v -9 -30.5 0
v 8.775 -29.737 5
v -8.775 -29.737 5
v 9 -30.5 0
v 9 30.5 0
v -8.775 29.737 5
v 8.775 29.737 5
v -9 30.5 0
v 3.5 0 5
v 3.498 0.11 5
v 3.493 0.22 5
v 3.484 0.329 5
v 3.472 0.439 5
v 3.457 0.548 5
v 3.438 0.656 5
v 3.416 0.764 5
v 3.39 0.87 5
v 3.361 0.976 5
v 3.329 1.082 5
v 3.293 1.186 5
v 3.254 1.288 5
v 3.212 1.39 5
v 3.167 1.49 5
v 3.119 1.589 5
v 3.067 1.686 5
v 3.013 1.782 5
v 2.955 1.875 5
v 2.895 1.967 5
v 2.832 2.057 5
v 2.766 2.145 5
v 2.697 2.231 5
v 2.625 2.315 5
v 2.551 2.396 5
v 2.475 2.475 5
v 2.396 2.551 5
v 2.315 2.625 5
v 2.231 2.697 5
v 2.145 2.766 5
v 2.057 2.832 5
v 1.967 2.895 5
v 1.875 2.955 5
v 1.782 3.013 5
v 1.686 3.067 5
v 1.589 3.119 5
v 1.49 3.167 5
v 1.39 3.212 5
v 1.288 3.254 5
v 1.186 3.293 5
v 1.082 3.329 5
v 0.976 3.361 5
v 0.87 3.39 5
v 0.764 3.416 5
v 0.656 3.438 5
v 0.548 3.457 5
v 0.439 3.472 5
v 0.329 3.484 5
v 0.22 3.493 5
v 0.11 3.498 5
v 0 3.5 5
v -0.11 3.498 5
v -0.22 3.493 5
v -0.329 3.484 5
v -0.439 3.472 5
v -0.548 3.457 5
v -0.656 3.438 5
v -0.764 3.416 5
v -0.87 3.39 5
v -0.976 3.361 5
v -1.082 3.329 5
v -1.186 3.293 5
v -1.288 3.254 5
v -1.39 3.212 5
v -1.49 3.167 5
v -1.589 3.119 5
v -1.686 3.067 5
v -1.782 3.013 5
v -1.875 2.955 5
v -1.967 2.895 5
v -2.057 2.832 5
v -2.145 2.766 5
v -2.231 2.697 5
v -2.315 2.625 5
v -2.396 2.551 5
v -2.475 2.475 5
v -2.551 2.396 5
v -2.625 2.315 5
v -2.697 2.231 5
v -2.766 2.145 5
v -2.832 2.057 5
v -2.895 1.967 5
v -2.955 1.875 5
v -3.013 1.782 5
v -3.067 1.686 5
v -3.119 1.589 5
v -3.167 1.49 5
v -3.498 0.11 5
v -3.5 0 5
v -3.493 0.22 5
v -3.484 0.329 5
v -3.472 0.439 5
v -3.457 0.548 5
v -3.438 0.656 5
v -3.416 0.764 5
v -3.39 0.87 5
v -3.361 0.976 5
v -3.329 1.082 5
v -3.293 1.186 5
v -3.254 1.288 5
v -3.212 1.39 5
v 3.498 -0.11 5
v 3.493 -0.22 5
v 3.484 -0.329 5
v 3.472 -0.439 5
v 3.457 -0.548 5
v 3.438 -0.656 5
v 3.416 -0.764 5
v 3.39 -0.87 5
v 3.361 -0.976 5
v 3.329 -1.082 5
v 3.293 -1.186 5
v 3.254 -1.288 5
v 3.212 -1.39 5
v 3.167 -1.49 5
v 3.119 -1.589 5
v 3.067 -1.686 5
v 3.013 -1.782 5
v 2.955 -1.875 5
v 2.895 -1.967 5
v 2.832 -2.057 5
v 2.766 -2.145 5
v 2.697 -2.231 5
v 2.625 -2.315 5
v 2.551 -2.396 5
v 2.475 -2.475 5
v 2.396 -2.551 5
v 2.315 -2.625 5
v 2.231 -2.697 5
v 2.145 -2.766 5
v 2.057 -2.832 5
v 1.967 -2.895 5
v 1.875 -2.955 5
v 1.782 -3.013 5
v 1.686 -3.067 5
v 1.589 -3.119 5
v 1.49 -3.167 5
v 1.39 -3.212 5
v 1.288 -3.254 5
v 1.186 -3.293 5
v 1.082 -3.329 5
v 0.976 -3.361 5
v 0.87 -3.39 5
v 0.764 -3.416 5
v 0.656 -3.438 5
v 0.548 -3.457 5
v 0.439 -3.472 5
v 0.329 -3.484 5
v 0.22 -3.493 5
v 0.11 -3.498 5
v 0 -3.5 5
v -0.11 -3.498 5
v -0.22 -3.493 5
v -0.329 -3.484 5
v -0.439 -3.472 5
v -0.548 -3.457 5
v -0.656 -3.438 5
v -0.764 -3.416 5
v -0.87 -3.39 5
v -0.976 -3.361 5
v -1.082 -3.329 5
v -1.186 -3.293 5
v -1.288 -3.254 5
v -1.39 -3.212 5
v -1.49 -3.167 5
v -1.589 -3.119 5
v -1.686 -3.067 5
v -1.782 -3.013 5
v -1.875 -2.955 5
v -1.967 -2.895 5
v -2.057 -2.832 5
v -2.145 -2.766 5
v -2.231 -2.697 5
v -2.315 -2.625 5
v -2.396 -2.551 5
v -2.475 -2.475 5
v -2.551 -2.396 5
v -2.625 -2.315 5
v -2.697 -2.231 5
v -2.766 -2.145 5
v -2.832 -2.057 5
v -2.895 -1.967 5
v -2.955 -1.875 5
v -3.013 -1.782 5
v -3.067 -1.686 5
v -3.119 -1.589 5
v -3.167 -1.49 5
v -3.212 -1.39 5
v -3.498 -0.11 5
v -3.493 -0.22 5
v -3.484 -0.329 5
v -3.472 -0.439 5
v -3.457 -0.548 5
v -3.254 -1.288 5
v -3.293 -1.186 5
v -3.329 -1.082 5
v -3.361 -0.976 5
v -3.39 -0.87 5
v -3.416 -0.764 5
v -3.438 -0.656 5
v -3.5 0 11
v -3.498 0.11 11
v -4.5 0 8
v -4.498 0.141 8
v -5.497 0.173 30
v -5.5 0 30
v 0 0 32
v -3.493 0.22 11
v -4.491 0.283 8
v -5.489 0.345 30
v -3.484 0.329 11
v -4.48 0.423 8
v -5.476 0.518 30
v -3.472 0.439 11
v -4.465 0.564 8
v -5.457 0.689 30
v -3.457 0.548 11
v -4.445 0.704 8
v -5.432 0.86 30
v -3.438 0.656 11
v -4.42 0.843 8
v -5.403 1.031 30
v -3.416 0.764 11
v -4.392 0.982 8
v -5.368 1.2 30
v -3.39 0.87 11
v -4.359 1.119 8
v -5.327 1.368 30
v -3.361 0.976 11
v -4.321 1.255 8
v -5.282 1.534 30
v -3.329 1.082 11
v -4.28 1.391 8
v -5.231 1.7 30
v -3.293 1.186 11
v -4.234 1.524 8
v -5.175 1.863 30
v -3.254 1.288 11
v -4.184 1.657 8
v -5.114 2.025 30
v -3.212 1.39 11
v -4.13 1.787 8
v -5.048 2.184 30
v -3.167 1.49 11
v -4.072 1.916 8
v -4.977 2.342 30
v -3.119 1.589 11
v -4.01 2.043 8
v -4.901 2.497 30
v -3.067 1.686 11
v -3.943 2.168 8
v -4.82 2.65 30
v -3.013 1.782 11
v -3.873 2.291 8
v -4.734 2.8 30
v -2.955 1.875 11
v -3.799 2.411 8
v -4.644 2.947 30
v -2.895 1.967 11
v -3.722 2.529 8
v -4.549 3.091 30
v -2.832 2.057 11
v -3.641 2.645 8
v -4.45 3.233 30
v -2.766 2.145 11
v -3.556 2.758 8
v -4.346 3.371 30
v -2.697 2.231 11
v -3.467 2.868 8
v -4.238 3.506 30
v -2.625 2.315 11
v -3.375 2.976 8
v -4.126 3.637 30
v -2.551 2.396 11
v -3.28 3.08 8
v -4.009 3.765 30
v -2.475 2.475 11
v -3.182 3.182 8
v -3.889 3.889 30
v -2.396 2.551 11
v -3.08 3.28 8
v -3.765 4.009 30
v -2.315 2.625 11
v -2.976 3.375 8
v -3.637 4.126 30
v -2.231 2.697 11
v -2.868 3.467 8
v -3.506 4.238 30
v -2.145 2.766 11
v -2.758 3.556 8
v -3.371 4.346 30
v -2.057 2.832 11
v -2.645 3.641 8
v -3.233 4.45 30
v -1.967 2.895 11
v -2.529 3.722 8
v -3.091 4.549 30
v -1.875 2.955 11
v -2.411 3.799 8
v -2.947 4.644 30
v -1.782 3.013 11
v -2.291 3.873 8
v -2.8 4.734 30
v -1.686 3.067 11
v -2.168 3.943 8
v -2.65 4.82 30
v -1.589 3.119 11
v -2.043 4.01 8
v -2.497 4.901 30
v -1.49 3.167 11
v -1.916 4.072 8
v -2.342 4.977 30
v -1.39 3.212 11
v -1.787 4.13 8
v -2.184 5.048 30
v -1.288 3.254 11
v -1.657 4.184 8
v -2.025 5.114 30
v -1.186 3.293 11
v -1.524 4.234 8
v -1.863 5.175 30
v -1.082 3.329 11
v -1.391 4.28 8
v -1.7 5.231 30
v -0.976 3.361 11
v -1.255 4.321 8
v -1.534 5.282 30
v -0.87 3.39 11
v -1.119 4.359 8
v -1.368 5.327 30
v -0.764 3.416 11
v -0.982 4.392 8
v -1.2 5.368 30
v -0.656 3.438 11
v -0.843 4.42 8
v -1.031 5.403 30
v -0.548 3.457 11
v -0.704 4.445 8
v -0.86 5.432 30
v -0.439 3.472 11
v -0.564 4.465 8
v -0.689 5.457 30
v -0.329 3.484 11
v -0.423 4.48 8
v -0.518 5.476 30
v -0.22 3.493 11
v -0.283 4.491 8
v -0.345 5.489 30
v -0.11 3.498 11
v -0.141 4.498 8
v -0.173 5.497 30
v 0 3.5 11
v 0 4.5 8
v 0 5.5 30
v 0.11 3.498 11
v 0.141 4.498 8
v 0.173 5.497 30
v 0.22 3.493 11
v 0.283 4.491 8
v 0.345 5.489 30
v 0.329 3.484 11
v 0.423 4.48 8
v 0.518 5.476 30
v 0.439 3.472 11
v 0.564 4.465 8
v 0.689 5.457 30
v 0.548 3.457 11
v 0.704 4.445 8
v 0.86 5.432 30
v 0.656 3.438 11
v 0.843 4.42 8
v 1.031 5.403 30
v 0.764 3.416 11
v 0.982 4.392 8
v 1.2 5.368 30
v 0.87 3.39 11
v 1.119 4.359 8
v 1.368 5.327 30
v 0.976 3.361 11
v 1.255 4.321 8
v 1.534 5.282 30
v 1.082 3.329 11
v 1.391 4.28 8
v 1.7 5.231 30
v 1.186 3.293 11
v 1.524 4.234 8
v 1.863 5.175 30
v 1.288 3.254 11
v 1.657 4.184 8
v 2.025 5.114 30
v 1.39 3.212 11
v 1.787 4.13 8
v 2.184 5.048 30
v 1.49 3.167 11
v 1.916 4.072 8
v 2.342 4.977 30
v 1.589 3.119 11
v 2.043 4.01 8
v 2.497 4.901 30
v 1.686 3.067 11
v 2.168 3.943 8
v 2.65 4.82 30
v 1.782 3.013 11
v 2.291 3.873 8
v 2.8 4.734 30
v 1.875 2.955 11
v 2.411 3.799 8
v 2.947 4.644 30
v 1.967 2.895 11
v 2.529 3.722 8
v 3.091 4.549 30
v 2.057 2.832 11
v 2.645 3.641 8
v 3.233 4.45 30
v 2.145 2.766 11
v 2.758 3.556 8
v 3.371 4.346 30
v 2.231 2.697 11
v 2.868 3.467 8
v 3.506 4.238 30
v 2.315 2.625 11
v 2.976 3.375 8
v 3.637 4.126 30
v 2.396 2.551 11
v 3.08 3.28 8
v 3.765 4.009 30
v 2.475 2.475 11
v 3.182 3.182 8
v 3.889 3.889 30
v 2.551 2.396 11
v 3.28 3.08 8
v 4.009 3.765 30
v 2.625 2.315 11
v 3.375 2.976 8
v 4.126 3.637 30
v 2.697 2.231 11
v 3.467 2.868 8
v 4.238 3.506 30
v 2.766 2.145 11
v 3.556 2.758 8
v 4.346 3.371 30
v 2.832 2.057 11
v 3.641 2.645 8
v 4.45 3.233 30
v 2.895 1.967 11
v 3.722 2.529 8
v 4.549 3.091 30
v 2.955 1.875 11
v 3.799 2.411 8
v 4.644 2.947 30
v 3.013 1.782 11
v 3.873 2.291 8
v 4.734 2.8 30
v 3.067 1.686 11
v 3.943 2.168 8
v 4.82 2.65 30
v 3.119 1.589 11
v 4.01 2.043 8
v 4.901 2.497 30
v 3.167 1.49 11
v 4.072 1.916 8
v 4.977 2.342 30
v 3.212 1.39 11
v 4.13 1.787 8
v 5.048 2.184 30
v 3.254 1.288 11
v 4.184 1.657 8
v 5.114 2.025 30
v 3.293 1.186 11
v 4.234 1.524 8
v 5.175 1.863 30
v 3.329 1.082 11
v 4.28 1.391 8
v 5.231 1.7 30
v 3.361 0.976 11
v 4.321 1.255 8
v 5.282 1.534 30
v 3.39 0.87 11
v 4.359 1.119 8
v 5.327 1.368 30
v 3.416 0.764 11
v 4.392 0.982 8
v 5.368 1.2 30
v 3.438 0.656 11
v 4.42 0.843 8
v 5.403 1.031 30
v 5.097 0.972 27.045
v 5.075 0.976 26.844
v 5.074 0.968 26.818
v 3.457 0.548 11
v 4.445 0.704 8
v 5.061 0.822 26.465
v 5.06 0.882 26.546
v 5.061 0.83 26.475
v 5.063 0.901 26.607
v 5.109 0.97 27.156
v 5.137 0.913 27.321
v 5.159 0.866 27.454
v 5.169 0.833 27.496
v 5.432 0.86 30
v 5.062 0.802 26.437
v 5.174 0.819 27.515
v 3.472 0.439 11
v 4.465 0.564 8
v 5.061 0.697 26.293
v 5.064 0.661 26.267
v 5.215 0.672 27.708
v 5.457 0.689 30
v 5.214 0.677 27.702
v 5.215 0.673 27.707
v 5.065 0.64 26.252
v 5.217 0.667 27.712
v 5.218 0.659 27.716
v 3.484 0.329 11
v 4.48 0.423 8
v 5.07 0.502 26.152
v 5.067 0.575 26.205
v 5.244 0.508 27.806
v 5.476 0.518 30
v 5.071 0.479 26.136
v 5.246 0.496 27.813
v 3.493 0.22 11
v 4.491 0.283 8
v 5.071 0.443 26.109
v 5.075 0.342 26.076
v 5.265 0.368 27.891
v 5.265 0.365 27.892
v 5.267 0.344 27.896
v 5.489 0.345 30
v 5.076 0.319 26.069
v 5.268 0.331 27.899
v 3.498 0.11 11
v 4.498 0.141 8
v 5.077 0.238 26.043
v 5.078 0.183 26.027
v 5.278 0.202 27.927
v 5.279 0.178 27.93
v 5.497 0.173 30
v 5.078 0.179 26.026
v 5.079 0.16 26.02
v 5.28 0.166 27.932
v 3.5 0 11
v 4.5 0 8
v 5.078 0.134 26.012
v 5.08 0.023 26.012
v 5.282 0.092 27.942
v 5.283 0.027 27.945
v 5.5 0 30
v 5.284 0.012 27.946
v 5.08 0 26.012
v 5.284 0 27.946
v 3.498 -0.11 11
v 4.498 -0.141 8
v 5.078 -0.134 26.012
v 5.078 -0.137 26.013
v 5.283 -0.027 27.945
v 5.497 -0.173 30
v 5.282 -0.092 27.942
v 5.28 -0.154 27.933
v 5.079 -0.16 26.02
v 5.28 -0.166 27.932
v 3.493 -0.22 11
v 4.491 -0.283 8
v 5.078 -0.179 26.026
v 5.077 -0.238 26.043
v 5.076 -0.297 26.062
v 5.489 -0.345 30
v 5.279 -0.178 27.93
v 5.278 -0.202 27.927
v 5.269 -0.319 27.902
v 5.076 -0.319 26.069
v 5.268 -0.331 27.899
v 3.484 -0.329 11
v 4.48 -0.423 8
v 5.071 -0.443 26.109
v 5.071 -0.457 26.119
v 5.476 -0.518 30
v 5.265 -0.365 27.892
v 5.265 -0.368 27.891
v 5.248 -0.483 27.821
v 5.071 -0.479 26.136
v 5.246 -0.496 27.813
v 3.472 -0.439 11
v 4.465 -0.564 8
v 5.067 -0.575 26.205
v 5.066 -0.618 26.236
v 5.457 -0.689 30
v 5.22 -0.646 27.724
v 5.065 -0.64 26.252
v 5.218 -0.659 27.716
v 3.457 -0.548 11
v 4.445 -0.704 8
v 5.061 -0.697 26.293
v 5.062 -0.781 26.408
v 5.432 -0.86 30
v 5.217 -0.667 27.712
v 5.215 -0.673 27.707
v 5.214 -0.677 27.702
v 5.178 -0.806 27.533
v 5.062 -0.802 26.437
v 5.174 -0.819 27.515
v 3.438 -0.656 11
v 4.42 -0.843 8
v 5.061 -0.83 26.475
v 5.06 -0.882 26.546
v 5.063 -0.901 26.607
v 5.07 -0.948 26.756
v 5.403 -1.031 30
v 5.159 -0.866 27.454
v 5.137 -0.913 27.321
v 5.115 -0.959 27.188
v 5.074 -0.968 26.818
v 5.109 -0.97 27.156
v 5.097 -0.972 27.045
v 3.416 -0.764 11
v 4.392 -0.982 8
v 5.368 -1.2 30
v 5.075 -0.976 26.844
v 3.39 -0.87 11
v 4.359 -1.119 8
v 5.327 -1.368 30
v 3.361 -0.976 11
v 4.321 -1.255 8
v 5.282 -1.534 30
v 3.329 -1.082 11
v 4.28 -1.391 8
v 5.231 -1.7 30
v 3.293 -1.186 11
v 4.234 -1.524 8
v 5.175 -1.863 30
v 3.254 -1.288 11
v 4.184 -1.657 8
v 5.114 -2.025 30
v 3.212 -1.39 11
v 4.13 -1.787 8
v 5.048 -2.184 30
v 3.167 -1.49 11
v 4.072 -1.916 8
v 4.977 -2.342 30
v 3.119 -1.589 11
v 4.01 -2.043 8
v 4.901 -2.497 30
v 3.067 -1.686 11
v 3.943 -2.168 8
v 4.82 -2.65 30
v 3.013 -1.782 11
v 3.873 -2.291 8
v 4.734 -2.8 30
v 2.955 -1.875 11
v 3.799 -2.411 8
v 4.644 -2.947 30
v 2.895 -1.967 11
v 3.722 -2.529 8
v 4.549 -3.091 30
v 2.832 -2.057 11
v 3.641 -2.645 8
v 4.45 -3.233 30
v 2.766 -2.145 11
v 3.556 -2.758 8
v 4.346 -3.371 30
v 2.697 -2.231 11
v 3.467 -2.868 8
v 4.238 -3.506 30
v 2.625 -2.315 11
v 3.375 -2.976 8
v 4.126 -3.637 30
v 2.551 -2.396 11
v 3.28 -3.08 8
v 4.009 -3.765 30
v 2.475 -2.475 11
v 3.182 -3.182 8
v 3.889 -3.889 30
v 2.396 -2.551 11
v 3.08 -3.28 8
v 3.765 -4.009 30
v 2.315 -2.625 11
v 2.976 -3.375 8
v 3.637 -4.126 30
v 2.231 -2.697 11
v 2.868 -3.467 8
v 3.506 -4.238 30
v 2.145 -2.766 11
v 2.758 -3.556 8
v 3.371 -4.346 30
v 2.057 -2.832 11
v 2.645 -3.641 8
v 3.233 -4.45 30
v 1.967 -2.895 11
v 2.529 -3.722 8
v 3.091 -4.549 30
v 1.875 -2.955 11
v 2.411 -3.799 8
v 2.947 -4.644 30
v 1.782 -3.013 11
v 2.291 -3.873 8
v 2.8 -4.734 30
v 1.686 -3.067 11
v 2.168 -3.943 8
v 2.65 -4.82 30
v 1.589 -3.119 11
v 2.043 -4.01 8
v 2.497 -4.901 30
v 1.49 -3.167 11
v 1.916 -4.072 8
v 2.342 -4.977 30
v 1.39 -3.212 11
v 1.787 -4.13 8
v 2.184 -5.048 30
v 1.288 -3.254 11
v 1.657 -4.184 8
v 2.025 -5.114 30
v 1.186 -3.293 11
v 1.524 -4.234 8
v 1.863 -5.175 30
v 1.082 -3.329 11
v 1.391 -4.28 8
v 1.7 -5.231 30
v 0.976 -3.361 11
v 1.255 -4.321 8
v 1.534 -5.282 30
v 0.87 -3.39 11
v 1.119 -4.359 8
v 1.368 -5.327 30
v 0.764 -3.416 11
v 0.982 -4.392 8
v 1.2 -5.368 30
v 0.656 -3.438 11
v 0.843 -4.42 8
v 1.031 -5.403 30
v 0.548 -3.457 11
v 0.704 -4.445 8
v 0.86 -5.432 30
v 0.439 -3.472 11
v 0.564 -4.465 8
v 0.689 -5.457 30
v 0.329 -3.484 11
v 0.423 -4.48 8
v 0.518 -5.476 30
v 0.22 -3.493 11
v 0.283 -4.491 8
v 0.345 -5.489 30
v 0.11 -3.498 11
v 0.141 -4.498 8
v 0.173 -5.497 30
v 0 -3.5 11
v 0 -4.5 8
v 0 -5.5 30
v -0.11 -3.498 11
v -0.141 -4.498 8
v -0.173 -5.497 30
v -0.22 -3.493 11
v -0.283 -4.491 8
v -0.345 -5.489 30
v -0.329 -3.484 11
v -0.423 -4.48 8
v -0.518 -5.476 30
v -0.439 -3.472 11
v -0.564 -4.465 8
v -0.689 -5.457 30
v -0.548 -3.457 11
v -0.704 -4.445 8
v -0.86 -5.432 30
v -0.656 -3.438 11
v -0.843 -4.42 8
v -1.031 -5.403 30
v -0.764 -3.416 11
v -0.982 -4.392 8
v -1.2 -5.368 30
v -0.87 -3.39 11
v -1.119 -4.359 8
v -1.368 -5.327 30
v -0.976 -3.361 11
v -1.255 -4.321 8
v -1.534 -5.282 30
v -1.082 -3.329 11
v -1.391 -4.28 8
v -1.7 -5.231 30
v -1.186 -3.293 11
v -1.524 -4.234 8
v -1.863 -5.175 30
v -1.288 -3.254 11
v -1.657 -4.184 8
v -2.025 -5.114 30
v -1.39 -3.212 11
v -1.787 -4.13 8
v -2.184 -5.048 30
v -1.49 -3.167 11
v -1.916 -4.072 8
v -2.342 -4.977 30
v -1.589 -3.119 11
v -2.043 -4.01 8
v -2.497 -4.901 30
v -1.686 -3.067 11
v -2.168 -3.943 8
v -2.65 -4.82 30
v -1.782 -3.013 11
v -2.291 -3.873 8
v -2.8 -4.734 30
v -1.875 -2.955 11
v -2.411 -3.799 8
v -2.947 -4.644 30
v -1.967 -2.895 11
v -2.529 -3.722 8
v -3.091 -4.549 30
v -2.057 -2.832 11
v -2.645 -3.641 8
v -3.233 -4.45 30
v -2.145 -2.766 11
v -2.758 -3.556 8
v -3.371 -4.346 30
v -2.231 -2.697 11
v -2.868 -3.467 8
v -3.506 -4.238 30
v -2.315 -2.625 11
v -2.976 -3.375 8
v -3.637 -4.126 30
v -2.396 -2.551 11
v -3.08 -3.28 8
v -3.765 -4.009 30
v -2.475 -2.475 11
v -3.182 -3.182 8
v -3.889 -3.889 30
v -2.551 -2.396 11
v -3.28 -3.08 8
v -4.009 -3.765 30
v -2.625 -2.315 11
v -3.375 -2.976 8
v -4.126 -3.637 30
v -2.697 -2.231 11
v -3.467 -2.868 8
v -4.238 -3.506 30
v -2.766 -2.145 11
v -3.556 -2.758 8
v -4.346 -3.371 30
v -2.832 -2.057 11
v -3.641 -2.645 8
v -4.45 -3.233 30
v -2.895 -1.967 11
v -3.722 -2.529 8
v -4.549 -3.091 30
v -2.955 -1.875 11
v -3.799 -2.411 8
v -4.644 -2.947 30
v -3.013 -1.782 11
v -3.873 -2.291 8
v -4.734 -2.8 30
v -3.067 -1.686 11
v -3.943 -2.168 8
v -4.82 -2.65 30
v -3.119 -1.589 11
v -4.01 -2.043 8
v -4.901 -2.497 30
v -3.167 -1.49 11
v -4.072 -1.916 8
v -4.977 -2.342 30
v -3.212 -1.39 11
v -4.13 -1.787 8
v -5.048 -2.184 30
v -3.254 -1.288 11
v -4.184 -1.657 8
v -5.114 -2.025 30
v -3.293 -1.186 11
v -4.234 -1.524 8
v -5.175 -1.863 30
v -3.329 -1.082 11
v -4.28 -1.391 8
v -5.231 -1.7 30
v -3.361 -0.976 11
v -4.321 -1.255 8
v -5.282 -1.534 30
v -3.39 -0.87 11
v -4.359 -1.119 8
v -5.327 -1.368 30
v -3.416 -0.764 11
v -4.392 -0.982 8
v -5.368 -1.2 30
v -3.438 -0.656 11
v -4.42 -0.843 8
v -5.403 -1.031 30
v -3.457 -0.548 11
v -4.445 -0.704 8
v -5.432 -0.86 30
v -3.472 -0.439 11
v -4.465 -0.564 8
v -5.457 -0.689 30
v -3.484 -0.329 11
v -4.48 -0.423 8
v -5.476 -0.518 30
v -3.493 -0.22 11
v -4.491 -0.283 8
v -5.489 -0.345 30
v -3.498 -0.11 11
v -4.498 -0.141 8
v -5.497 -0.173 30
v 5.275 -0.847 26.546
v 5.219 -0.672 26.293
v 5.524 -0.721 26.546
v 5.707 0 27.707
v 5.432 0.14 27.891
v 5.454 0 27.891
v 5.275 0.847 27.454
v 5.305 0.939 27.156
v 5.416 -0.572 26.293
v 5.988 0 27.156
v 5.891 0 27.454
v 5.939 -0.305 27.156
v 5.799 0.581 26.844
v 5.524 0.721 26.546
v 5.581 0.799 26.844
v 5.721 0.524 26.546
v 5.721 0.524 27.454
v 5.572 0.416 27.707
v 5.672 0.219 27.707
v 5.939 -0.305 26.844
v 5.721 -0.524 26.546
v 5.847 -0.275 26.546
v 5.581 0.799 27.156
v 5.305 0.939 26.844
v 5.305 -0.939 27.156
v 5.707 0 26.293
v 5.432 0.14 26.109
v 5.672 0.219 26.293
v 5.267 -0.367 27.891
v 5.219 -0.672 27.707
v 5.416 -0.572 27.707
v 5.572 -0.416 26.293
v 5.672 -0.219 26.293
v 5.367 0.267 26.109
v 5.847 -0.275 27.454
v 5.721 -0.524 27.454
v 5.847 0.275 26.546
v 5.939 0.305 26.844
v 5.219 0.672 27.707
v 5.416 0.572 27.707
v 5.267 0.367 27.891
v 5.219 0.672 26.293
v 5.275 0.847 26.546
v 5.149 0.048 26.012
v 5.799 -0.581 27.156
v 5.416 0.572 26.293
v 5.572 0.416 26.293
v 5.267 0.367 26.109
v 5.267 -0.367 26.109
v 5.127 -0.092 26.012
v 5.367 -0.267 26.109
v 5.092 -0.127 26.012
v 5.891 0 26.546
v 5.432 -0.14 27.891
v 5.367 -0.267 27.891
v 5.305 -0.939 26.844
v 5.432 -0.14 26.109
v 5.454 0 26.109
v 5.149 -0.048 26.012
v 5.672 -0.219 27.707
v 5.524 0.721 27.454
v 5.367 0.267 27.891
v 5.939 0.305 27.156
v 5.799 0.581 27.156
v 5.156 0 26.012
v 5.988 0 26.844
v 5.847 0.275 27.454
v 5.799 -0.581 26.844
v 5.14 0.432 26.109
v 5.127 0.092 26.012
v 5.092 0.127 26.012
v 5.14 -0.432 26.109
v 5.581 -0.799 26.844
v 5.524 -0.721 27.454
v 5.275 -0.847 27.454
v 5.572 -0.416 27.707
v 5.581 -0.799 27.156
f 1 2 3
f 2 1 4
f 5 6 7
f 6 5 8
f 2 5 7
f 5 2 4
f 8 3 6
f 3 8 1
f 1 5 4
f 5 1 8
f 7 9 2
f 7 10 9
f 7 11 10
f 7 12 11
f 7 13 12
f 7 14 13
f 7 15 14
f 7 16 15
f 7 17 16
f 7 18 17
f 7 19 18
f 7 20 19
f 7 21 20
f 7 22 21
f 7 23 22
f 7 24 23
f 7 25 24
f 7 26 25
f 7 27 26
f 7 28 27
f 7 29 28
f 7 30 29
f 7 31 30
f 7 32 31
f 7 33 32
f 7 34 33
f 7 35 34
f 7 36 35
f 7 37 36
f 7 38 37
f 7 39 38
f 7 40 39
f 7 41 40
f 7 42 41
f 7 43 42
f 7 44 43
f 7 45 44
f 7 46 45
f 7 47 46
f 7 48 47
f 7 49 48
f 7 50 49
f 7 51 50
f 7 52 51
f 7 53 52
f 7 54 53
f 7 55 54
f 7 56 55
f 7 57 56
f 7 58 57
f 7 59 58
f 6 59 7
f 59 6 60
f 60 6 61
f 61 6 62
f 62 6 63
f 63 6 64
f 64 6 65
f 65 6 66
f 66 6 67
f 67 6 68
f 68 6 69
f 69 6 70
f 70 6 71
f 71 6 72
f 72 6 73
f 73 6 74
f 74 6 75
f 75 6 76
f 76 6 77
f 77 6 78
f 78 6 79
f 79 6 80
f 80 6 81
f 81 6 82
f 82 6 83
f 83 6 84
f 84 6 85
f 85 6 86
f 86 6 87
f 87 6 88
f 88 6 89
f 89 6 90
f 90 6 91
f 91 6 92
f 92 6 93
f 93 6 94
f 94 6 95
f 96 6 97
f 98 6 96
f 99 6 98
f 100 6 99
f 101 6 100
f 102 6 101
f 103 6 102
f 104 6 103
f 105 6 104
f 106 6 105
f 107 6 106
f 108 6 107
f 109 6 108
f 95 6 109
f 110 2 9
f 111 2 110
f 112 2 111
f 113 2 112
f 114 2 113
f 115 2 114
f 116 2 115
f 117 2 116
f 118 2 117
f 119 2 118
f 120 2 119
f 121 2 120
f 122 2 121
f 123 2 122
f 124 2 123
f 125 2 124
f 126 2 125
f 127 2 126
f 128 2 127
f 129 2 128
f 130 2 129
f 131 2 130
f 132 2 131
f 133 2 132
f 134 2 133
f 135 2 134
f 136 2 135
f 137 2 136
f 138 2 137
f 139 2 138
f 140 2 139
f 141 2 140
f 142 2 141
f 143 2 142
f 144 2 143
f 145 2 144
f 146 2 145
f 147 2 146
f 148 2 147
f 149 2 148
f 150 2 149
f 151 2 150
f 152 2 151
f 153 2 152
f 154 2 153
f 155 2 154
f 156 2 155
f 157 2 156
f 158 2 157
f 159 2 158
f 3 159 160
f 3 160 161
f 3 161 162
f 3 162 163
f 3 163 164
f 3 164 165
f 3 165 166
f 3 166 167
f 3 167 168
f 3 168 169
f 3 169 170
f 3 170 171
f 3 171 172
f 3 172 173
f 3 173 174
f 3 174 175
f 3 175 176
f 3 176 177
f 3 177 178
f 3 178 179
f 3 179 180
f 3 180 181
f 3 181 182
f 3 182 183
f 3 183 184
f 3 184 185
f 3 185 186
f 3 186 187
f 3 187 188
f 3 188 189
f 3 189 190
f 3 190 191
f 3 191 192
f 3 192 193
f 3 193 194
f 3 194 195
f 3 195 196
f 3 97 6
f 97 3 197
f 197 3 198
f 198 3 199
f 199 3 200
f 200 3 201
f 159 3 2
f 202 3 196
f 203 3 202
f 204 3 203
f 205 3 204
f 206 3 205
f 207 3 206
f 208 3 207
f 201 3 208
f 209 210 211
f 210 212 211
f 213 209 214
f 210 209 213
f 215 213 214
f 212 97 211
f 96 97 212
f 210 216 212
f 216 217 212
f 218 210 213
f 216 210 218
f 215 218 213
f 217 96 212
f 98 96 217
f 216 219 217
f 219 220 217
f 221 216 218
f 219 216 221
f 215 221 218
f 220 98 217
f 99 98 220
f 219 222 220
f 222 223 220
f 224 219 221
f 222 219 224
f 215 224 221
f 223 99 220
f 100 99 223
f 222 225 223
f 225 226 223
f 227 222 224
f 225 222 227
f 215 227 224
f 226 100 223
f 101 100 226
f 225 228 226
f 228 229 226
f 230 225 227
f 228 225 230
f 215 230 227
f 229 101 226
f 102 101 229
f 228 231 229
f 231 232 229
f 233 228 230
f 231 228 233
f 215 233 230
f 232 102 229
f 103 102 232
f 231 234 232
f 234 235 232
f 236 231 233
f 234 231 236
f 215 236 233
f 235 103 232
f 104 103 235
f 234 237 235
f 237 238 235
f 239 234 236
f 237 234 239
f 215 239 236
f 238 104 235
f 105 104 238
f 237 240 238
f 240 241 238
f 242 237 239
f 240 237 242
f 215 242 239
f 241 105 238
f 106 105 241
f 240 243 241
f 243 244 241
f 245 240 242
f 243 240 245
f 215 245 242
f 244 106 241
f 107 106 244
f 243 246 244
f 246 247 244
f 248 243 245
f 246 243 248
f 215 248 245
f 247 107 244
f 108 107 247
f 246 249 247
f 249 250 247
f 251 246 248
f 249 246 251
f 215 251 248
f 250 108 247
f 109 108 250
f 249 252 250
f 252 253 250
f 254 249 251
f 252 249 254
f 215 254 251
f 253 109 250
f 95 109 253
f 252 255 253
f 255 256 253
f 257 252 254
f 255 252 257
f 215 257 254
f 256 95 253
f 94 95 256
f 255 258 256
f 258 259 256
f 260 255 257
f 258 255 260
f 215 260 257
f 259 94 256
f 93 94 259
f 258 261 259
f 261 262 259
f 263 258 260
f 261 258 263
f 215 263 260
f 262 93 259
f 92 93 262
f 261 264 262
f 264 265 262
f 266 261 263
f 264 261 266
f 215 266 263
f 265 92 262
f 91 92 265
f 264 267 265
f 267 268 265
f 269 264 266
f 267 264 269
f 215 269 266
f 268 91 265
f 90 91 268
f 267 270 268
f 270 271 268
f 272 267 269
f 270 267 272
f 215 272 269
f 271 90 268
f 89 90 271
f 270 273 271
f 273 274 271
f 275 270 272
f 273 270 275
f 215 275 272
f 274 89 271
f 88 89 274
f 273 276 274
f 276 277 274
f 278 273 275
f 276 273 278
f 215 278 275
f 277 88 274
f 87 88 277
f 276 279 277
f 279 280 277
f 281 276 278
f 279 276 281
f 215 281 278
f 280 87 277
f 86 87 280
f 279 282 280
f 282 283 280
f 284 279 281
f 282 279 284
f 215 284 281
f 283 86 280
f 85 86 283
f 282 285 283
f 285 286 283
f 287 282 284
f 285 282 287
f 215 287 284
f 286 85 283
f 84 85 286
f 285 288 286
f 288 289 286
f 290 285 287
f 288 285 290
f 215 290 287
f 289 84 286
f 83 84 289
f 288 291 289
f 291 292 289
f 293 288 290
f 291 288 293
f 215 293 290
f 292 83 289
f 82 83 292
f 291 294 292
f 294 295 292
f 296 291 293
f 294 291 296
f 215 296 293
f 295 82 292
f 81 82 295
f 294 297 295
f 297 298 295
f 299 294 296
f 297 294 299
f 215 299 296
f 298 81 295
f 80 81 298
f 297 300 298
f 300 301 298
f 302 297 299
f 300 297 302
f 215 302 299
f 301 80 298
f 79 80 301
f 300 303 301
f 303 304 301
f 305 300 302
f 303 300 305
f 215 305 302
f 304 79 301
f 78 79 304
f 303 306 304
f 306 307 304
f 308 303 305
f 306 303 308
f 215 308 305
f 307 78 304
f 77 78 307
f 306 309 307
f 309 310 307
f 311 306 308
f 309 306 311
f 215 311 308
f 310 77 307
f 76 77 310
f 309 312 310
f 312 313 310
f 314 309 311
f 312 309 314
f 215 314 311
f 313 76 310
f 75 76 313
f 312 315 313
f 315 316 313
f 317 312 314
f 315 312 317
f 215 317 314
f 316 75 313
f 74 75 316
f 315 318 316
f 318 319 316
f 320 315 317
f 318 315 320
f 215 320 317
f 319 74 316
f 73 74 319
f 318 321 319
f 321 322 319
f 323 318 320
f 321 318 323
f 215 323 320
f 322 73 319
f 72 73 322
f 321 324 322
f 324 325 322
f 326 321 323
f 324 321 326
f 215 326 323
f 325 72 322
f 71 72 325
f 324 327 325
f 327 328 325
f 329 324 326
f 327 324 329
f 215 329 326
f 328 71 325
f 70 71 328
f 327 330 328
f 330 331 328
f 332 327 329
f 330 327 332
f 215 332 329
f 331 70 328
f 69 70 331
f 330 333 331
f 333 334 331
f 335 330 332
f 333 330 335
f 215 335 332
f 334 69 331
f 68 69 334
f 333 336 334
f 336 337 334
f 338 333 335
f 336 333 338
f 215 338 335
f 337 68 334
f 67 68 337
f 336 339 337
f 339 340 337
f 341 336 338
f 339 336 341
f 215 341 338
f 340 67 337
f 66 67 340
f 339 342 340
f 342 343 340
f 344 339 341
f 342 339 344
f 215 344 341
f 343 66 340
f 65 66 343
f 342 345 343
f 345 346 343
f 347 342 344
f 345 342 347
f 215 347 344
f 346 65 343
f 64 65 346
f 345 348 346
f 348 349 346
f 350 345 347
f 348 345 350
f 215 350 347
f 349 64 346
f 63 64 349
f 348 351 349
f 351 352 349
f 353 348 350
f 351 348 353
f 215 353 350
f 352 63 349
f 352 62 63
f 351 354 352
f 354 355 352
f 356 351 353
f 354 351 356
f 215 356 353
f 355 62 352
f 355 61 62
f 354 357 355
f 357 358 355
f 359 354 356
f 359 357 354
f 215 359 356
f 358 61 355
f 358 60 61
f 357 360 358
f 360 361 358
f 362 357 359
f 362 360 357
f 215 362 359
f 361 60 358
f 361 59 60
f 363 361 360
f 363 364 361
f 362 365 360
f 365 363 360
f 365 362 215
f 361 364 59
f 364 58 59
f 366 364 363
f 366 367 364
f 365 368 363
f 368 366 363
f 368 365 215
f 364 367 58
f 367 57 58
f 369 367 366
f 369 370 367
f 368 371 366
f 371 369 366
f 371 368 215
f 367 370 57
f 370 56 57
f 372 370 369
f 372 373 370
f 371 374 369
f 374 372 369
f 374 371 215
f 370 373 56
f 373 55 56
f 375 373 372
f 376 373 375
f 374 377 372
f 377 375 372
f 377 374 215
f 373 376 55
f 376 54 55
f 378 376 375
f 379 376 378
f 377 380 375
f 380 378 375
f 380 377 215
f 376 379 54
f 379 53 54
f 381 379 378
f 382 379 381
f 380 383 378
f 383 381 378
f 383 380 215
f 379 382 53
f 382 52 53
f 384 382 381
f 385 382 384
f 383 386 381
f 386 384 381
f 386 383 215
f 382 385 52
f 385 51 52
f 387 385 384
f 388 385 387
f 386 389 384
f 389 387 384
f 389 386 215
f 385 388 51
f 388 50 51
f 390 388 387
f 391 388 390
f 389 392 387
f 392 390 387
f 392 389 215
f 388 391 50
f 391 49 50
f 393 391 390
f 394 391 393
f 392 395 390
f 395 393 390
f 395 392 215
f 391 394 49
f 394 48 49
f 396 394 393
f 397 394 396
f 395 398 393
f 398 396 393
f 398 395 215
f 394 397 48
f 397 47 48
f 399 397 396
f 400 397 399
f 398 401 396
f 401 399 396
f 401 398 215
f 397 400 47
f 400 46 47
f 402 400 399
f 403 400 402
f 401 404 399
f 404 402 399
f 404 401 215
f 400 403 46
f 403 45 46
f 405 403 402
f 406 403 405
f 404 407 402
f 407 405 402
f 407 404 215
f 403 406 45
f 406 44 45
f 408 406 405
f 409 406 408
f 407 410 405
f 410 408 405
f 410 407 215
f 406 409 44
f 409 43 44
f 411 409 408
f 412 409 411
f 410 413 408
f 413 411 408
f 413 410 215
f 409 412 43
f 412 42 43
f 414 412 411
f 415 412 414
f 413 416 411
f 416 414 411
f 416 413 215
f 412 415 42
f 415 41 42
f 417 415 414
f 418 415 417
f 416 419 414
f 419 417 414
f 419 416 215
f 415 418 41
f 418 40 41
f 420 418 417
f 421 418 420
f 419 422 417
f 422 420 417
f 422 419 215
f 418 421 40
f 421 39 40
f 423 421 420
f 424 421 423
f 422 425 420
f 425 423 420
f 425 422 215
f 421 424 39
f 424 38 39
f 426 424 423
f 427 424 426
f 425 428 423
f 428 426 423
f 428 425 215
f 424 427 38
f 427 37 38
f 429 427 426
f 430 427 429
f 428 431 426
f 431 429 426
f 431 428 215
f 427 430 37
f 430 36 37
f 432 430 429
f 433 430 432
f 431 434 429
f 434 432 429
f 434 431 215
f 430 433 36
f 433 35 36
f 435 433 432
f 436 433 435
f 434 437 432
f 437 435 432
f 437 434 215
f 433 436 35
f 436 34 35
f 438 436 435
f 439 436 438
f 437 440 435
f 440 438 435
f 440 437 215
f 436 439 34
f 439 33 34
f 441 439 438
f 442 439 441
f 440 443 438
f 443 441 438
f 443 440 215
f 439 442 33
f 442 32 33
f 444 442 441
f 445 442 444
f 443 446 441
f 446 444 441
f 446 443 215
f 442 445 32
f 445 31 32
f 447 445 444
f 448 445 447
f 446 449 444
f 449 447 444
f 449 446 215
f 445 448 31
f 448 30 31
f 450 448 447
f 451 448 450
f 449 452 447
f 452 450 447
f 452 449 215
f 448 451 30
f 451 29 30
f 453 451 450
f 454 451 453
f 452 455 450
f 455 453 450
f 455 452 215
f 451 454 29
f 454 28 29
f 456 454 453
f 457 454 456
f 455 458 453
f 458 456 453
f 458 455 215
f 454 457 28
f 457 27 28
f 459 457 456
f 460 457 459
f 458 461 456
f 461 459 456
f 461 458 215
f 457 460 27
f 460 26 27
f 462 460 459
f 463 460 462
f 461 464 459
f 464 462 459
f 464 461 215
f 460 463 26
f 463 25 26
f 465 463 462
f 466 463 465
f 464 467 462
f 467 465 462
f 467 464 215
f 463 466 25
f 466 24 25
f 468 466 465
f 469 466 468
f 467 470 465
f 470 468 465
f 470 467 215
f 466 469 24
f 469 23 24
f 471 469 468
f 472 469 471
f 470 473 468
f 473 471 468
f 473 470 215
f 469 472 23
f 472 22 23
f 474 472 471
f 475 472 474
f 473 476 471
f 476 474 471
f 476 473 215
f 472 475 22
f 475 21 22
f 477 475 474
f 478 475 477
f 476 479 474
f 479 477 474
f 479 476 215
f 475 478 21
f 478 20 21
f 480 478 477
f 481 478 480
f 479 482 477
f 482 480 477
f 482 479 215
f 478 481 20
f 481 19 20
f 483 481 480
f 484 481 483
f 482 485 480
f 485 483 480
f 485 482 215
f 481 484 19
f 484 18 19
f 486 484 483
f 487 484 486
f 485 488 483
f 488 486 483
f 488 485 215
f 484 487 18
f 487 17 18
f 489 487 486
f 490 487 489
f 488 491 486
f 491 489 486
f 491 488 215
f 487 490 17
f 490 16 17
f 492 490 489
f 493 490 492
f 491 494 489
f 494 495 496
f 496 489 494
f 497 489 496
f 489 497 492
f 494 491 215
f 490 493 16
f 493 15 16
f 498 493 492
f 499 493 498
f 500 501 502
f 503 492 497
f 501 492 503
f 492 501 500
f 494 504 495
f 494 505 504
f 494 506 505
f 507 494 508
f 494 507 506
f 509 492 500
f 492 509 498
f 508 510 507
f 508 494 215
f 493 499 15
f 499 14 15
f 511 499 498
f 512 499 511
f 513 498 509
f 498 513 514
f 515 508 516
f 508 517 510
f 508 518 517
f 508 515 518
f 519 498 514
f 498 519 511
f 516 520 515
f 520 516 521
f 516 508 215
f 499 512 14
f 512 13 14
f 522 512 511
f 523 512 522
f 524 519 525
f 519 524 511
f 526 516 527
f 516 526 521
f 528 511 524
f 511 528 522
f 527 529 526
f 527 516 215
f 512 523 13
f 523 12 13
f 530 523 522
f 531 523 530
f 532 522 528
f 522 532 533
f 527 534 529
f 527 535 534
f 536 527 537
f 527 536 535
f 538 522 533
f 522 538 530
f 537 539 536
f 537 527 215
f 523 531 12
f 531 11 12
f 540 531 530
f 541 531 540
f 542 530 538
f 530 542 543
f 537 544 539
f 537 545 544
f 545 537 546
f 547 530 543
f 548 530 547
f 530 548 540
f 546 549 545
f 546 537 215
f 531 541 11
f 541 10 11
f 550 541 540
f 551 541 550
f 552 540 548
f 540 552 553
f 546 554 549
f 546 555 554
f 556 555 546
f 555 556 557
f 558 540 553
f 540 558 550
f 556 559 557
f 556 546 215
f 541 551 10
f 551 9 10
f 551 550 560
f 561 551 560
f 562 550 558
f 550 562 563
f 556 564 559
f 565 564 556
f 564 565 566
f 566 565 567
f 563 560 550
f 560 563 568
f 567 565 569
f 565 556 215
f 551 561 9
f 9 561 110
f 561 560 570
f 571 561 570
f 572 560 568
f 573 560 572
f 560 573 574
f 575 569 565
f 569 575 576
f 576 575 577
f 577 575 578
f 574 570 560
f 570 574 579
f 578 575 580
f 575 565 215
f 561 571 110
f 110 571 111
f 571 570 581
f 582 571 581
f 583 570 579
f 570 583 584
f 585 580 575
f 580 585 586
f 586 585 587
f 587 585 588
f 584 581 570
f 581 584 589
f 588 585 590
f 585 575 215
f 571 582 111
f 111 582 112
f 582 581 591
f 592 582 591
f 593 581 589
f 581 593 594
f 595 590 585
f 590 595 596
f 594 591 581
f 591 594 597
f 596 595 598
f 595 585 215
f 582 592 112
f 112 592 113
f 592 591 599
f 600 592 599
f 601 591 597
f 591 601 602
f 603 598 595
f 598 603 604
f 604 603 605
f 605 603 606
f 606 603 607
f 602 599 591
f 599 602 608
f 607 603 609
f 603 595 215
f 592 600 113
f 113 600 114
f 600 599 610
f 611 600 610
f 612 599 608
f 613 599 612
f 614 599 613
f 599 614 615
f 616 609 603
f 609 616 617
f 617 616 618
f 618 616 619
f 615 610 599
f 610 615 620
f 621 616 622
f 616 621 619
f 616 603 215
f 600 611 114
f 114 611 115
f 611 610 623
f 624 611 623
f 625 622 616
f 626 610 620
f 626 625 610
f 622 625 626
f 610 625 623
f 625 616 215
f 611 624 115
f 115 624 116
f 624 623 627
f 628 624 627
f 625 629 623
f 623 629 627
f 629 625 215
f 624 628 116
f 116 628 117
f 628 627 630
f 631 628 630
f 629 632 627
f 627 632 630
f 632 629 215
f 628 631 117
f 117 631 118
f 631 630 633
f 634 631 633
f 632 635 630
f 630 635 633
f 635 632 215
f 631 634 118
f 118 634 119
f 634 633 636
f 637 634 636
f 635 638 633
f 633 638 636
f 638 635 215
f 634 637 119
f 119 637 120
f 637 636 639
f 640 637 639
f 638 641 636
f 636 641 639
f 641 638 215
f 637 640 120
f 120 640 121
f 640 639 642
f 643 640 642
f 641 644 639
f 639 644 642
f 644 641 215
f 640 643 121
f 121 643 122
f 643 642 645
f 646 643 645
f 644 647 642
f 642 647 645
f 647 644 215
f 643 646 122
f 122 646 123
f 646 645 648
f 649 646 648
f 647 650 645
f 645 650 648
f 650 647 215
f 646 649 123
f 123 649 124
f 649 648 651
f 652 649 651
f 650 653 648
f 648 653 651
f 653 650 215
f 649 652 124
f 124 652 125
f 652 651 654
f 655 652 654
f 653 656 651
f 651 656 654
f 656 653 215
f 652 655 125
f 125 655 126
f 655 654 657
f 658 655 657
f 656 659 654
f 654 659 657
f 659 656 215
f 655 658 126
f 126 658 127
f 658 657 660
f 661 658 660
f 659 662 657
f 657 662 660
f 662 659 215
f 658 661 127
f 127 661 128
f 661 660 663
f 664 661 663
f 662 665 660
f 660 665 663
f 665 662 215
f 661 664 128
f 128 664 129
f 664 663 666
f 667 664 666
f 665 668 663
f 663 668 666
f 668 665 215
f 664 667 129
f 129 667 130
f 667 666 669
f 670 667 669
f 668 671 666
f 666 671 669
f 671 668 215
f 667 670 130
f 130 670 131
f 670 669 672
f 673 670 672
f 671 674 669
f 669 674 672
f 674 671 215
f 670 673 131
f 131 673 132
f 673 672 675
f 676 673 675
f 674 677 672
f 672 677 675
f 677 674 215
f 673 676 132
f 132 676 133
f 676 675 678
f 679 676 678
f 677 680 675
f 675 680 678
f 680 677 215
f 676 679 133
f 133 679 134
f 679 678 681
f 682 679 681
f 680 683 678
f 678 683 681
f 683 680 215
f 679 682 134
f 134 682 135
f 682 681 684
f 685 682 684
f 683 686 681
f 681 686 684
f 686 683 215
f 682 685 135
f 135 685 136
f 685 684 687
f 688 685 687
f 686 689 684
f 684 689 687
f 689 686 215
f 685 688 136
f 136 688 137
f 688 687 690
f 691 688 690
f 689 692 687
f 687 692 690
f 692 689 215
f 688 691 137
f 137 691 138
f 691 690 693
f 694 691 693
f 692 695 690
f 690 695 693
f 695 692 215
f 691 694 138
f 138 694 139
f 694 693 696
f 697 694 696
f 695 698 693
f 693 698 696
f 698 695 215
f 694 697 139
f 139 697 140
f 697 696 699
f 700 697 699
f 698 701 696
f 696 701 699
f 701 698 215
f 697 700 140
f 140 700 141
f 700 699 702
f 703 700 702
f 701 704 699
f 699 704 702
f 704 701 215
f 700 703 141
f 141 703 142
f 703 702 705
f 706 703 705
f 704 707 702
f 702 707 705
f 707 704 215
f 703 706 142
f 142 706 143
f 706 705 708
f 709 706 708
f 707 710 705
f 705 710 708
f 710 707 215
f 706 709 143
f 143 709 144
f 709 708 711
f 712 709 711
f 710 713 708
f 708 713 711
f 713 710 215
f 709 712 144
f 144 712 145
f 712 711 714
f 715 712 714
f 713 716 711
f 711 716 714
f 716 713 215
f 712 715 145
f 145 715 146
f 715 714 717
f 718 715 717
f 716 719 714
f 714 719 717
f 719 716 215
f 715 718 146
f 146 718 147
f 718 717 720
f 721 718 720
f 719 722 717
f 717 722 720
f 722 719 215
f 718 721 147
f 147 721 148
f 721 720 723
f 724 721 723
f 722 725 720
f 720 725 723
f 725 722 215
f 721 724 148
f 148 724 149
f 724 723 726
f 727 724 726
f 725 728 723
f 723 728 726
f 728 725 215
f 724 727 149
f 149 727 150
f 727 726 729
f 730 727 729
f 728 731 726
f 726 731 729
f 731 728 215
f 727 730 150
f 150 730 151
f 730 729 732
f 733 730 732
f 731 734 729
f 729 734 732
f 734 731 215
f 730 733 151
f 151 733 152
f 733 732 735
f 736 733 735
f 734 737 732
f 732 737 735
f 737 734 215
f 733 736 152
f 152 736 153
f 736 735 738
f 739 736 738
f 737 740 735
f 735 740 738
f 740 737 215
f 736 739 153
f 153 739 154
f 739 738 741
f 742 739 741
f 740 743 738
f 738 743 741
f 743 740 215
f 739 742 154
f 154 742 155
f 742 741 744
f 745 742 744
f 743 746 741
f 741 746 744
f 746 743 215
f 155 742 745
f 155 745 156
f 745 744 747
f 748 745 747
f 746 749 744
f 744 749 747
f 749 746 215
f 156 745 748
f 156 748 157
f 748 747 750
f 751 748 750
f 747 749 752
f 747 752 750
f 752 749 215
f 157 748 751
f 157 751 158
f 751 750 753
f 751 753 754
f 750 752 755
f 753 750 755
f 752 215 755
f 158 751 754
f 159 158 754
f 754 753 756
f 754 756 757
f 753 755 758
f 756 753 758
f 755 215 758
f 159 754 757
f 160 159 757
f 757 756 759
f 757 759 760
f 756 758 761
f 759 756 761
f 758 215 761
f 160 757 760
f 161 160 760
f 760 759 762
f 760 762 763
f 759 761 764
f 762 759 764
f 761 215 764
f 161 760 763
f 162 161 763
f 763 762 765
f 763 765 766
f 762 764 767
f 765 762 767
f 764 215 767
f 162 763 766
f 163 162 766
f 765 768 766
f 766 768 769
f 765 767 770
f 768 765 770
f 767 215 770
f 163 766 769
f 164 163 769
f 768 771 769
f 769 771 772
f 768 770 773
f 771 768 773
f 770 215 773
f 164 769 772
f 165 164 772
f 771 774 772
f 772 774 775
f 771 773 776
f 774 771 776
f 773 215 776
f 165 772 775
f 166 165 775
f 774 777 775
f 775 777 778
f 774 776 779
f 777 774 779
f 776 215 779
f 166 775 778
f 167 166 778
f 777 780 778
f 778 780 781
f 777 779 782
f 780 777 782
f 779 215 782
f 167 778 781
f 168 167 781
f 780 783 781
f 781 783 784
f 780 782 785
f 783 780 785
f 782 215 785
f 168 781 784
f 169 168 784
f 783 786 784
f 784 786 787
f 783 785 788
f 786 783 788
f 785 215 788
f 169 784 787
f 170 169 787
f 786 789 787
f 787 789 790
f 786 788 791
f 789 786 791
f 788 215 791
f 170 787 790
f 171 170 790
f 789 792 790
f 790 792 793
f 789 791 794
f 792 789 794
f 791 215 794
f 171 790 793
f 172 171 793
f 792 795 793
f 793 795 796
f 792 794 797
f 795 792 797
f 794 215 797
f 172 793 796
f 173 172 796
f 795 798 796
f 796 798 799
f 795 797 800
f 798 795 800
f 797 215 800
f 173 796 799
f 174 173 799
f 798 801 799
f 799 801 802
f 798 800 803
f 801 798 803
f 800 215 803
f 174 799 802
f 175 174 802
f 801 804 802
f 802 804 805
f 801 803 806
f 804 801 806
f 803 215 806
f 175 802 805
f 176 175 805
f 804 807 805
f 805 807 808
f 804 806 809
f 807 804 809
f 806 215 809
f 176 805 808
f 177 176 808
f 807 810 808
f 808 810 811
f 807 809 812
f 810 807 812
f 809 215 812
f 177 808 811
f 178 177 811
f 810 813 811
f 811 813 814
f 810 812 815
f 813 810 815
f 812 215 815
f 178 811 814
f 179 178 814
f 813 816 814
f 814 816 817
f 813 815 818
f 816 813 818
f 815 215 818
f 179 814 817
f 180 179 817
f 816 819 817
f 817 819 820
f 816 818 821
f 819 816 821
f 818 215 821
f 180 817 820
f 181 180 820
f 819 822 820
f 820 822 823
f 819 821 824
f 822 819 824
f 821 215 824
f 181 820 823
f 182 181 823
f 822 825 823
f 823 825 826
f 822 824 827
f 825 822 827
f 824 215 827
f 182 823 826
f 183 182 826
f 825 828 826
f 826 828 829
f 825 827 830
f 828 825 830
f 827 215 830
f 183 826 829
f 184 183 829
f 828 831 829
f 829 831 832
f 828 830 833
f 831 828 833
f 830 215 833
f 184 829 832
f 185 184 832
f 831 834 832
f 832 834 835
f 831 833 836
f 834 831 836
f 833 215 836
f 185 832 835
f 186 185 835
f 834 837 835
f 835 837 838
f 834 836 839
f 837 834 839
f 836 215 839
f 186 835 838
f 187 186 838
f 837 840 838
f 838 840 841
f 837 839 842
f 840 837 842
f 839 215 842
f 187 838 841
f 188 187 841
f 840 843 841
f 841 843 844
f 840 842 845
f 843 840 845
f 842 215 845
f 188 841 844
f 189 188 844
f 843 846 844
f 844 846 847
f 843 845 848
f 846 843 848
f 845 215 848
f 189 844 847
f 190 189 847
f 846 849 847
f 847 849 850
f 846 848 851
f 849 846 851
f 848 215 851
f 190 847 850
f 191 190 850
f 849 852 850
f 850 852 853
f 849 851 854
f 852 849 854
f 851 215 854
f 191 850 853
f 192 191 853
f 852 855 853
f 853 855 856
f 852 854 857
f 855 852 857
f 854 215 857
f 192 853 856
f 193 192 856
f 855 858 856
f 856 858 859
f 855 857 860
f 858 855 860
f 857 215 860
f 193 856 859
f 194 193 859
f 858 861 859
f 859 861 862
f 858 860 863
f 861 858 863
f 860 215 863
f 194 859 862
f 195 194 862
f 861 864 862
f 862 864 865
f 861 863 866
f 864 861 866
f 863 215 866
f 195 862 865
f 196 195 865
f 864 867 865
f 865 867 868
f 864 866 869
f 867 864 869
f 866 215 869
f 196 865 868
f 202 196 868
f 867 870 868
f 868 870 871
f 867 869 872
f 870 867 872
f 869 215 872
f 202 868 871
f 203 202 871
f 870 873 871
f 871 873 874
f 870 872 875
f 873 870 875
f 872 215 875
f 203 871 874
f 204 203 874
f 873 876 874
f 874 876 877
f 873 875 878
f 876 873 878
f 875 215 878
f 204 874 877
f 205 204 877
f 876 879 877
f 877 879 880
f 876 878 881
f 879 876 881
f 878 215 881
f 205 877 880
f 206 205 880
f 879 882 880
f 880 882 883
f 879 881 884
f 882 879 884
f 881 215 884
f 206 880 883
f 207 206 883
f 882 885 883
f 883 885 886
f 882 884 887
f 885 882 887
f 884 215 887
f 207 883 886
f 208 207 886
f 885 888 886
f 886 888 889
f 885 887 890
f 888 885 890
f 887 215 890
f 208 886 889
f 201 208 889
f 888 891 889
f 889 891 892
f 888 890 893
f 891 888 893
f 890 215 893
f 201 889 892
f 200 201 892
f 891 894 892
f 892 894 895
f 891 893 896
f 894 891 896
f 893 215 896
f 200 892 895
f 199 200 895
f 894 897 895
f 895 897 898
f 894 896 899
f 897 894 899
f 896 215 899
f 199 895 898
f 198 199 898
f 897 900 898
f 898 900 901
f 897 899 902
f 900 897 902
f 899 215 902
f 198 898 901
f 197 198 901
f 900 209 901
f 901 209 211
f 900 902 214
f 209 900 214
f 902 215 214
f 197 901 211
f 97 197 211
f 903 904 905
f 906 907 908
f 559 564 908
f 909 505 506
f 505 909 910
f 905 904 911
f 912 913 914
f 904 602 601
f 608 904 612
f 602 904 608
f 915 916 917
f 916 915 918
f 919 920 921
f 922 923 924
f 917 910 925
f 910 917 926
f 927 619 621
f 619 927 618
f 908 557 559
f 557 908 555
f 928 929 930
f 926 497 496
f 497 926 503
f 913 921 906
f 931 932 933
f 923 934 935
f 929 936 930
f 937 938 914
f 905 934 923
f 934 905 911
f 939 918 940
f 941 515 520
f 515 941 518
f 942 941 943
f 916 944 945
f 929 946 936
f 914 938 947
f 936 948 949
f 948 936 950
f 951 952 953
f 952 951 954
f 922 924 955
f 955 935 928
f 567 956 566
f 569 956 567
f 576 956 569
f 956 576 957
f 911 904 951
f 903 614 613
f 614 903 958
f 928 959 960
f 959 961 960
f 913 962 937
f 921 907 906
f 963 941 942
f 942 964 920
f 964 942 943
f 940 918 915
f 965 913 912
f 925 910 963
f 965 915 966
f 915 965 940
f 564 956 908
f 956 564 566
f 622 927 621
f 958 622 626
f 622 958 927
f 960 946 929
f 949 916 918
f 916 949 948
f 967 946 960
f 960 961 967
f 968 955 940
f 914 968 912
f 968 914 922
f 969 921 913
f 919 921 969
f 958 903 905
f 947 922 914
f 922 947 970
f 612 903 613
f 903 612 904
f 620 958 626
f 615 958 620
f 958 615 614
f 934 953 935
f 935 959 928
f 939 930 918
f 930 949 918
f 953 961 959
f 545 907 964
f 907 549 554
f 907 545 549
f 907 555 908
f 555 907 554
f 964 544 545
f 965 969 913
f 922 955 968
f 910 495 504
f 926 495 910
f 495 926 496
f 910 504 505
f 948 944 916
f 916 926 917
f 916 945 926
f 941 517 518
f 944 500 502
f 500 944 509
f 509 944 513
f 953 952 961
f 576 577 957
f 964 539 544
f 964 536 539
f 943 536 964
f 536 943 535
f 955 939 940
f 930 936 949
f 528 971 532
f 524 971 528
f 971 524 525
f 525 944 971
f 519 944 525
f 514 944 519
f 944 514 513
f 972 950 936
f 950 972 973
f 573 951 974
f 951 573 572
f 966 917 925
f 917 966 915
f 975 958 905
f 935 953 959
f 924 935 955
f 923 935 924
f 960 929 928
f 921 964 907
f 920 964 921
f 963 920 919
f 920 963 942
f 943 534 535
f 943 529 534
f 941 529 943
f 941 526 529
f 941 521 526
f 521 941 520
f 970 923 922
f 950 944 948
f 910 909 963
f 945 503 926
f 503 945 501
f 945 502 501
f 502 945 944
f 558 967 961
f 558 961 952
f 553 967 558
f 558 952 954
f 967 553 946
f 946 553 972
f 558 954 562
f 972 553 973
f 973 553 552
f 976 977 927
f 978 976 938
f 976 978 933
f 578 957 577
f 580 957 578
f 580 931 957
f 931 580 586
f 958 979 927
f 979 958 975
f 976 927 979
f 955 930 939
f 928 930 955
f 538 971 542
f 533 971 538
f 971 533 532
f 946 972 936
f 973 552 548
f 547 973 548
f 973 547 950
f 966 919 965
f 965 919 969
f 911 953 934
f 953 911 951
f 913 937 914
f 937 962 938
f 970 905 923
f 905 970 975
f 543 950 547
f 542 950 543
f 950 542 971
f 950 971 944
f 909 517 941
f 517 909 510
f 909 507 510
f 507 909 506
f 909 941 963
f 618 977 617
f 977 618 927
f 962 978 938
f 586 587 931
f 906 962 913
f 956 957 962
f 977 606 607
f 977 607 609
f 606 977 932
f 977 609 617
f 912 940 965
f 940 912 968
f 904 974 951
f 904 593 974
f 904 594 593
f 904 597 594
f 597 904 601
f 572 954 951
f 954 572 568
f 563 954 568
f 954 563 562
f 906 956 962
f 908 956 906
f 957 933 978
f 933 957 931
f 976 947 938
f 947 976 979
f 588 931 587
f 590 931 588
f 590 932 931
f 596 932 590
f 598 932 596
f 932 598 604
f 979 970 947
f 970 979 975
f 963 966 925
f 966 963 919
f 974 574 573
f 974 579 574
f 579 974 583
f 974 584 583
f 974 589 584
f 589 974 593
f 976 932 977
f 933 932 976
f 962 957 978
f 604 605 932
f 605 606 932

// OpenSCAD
WIDTH 	= 18; // [0:200]
LENGTH 	= 61; // [0:200]


translate([-WIDTH/2,-LENGTH/2,0]) {
	difference() {
		pyramid(WIDTH,LENGTH,200);
	   translate([0,0,5]) cube([WIDTH,LENGTH,200]);
	}
	
	translate([WIDTH/2,LENGTH/2,5]) {
		rotate_extrude($fn=200) polygon(points=[[0,0],[3.5,0],[4.5,3],[3.5,6],[5.5,25],[0,27]]);
		translate([5,0,22]) sphere(r=1, $fn=20);
	}
}



// By Danny Staple, https://github.com/dannystaple/OpenSCAD-Parts-Library
module pyramid(w, l, h) {
	mw = w/2;
	ml = l/2;
	polyhedron(points = [
		[0, 0, 0],
		[w, 0, 0],
		[0, l, 0],
		[w, l, 0],
		[mw, ml, h]
	], triangles = [
		[4, 1, 0],
		[4, 3, 1],
		[4, 2, 3],
		[4, 0, 2],
	//base
		[0, 1, 2],
		[2, 1, 3]
	]);
}
